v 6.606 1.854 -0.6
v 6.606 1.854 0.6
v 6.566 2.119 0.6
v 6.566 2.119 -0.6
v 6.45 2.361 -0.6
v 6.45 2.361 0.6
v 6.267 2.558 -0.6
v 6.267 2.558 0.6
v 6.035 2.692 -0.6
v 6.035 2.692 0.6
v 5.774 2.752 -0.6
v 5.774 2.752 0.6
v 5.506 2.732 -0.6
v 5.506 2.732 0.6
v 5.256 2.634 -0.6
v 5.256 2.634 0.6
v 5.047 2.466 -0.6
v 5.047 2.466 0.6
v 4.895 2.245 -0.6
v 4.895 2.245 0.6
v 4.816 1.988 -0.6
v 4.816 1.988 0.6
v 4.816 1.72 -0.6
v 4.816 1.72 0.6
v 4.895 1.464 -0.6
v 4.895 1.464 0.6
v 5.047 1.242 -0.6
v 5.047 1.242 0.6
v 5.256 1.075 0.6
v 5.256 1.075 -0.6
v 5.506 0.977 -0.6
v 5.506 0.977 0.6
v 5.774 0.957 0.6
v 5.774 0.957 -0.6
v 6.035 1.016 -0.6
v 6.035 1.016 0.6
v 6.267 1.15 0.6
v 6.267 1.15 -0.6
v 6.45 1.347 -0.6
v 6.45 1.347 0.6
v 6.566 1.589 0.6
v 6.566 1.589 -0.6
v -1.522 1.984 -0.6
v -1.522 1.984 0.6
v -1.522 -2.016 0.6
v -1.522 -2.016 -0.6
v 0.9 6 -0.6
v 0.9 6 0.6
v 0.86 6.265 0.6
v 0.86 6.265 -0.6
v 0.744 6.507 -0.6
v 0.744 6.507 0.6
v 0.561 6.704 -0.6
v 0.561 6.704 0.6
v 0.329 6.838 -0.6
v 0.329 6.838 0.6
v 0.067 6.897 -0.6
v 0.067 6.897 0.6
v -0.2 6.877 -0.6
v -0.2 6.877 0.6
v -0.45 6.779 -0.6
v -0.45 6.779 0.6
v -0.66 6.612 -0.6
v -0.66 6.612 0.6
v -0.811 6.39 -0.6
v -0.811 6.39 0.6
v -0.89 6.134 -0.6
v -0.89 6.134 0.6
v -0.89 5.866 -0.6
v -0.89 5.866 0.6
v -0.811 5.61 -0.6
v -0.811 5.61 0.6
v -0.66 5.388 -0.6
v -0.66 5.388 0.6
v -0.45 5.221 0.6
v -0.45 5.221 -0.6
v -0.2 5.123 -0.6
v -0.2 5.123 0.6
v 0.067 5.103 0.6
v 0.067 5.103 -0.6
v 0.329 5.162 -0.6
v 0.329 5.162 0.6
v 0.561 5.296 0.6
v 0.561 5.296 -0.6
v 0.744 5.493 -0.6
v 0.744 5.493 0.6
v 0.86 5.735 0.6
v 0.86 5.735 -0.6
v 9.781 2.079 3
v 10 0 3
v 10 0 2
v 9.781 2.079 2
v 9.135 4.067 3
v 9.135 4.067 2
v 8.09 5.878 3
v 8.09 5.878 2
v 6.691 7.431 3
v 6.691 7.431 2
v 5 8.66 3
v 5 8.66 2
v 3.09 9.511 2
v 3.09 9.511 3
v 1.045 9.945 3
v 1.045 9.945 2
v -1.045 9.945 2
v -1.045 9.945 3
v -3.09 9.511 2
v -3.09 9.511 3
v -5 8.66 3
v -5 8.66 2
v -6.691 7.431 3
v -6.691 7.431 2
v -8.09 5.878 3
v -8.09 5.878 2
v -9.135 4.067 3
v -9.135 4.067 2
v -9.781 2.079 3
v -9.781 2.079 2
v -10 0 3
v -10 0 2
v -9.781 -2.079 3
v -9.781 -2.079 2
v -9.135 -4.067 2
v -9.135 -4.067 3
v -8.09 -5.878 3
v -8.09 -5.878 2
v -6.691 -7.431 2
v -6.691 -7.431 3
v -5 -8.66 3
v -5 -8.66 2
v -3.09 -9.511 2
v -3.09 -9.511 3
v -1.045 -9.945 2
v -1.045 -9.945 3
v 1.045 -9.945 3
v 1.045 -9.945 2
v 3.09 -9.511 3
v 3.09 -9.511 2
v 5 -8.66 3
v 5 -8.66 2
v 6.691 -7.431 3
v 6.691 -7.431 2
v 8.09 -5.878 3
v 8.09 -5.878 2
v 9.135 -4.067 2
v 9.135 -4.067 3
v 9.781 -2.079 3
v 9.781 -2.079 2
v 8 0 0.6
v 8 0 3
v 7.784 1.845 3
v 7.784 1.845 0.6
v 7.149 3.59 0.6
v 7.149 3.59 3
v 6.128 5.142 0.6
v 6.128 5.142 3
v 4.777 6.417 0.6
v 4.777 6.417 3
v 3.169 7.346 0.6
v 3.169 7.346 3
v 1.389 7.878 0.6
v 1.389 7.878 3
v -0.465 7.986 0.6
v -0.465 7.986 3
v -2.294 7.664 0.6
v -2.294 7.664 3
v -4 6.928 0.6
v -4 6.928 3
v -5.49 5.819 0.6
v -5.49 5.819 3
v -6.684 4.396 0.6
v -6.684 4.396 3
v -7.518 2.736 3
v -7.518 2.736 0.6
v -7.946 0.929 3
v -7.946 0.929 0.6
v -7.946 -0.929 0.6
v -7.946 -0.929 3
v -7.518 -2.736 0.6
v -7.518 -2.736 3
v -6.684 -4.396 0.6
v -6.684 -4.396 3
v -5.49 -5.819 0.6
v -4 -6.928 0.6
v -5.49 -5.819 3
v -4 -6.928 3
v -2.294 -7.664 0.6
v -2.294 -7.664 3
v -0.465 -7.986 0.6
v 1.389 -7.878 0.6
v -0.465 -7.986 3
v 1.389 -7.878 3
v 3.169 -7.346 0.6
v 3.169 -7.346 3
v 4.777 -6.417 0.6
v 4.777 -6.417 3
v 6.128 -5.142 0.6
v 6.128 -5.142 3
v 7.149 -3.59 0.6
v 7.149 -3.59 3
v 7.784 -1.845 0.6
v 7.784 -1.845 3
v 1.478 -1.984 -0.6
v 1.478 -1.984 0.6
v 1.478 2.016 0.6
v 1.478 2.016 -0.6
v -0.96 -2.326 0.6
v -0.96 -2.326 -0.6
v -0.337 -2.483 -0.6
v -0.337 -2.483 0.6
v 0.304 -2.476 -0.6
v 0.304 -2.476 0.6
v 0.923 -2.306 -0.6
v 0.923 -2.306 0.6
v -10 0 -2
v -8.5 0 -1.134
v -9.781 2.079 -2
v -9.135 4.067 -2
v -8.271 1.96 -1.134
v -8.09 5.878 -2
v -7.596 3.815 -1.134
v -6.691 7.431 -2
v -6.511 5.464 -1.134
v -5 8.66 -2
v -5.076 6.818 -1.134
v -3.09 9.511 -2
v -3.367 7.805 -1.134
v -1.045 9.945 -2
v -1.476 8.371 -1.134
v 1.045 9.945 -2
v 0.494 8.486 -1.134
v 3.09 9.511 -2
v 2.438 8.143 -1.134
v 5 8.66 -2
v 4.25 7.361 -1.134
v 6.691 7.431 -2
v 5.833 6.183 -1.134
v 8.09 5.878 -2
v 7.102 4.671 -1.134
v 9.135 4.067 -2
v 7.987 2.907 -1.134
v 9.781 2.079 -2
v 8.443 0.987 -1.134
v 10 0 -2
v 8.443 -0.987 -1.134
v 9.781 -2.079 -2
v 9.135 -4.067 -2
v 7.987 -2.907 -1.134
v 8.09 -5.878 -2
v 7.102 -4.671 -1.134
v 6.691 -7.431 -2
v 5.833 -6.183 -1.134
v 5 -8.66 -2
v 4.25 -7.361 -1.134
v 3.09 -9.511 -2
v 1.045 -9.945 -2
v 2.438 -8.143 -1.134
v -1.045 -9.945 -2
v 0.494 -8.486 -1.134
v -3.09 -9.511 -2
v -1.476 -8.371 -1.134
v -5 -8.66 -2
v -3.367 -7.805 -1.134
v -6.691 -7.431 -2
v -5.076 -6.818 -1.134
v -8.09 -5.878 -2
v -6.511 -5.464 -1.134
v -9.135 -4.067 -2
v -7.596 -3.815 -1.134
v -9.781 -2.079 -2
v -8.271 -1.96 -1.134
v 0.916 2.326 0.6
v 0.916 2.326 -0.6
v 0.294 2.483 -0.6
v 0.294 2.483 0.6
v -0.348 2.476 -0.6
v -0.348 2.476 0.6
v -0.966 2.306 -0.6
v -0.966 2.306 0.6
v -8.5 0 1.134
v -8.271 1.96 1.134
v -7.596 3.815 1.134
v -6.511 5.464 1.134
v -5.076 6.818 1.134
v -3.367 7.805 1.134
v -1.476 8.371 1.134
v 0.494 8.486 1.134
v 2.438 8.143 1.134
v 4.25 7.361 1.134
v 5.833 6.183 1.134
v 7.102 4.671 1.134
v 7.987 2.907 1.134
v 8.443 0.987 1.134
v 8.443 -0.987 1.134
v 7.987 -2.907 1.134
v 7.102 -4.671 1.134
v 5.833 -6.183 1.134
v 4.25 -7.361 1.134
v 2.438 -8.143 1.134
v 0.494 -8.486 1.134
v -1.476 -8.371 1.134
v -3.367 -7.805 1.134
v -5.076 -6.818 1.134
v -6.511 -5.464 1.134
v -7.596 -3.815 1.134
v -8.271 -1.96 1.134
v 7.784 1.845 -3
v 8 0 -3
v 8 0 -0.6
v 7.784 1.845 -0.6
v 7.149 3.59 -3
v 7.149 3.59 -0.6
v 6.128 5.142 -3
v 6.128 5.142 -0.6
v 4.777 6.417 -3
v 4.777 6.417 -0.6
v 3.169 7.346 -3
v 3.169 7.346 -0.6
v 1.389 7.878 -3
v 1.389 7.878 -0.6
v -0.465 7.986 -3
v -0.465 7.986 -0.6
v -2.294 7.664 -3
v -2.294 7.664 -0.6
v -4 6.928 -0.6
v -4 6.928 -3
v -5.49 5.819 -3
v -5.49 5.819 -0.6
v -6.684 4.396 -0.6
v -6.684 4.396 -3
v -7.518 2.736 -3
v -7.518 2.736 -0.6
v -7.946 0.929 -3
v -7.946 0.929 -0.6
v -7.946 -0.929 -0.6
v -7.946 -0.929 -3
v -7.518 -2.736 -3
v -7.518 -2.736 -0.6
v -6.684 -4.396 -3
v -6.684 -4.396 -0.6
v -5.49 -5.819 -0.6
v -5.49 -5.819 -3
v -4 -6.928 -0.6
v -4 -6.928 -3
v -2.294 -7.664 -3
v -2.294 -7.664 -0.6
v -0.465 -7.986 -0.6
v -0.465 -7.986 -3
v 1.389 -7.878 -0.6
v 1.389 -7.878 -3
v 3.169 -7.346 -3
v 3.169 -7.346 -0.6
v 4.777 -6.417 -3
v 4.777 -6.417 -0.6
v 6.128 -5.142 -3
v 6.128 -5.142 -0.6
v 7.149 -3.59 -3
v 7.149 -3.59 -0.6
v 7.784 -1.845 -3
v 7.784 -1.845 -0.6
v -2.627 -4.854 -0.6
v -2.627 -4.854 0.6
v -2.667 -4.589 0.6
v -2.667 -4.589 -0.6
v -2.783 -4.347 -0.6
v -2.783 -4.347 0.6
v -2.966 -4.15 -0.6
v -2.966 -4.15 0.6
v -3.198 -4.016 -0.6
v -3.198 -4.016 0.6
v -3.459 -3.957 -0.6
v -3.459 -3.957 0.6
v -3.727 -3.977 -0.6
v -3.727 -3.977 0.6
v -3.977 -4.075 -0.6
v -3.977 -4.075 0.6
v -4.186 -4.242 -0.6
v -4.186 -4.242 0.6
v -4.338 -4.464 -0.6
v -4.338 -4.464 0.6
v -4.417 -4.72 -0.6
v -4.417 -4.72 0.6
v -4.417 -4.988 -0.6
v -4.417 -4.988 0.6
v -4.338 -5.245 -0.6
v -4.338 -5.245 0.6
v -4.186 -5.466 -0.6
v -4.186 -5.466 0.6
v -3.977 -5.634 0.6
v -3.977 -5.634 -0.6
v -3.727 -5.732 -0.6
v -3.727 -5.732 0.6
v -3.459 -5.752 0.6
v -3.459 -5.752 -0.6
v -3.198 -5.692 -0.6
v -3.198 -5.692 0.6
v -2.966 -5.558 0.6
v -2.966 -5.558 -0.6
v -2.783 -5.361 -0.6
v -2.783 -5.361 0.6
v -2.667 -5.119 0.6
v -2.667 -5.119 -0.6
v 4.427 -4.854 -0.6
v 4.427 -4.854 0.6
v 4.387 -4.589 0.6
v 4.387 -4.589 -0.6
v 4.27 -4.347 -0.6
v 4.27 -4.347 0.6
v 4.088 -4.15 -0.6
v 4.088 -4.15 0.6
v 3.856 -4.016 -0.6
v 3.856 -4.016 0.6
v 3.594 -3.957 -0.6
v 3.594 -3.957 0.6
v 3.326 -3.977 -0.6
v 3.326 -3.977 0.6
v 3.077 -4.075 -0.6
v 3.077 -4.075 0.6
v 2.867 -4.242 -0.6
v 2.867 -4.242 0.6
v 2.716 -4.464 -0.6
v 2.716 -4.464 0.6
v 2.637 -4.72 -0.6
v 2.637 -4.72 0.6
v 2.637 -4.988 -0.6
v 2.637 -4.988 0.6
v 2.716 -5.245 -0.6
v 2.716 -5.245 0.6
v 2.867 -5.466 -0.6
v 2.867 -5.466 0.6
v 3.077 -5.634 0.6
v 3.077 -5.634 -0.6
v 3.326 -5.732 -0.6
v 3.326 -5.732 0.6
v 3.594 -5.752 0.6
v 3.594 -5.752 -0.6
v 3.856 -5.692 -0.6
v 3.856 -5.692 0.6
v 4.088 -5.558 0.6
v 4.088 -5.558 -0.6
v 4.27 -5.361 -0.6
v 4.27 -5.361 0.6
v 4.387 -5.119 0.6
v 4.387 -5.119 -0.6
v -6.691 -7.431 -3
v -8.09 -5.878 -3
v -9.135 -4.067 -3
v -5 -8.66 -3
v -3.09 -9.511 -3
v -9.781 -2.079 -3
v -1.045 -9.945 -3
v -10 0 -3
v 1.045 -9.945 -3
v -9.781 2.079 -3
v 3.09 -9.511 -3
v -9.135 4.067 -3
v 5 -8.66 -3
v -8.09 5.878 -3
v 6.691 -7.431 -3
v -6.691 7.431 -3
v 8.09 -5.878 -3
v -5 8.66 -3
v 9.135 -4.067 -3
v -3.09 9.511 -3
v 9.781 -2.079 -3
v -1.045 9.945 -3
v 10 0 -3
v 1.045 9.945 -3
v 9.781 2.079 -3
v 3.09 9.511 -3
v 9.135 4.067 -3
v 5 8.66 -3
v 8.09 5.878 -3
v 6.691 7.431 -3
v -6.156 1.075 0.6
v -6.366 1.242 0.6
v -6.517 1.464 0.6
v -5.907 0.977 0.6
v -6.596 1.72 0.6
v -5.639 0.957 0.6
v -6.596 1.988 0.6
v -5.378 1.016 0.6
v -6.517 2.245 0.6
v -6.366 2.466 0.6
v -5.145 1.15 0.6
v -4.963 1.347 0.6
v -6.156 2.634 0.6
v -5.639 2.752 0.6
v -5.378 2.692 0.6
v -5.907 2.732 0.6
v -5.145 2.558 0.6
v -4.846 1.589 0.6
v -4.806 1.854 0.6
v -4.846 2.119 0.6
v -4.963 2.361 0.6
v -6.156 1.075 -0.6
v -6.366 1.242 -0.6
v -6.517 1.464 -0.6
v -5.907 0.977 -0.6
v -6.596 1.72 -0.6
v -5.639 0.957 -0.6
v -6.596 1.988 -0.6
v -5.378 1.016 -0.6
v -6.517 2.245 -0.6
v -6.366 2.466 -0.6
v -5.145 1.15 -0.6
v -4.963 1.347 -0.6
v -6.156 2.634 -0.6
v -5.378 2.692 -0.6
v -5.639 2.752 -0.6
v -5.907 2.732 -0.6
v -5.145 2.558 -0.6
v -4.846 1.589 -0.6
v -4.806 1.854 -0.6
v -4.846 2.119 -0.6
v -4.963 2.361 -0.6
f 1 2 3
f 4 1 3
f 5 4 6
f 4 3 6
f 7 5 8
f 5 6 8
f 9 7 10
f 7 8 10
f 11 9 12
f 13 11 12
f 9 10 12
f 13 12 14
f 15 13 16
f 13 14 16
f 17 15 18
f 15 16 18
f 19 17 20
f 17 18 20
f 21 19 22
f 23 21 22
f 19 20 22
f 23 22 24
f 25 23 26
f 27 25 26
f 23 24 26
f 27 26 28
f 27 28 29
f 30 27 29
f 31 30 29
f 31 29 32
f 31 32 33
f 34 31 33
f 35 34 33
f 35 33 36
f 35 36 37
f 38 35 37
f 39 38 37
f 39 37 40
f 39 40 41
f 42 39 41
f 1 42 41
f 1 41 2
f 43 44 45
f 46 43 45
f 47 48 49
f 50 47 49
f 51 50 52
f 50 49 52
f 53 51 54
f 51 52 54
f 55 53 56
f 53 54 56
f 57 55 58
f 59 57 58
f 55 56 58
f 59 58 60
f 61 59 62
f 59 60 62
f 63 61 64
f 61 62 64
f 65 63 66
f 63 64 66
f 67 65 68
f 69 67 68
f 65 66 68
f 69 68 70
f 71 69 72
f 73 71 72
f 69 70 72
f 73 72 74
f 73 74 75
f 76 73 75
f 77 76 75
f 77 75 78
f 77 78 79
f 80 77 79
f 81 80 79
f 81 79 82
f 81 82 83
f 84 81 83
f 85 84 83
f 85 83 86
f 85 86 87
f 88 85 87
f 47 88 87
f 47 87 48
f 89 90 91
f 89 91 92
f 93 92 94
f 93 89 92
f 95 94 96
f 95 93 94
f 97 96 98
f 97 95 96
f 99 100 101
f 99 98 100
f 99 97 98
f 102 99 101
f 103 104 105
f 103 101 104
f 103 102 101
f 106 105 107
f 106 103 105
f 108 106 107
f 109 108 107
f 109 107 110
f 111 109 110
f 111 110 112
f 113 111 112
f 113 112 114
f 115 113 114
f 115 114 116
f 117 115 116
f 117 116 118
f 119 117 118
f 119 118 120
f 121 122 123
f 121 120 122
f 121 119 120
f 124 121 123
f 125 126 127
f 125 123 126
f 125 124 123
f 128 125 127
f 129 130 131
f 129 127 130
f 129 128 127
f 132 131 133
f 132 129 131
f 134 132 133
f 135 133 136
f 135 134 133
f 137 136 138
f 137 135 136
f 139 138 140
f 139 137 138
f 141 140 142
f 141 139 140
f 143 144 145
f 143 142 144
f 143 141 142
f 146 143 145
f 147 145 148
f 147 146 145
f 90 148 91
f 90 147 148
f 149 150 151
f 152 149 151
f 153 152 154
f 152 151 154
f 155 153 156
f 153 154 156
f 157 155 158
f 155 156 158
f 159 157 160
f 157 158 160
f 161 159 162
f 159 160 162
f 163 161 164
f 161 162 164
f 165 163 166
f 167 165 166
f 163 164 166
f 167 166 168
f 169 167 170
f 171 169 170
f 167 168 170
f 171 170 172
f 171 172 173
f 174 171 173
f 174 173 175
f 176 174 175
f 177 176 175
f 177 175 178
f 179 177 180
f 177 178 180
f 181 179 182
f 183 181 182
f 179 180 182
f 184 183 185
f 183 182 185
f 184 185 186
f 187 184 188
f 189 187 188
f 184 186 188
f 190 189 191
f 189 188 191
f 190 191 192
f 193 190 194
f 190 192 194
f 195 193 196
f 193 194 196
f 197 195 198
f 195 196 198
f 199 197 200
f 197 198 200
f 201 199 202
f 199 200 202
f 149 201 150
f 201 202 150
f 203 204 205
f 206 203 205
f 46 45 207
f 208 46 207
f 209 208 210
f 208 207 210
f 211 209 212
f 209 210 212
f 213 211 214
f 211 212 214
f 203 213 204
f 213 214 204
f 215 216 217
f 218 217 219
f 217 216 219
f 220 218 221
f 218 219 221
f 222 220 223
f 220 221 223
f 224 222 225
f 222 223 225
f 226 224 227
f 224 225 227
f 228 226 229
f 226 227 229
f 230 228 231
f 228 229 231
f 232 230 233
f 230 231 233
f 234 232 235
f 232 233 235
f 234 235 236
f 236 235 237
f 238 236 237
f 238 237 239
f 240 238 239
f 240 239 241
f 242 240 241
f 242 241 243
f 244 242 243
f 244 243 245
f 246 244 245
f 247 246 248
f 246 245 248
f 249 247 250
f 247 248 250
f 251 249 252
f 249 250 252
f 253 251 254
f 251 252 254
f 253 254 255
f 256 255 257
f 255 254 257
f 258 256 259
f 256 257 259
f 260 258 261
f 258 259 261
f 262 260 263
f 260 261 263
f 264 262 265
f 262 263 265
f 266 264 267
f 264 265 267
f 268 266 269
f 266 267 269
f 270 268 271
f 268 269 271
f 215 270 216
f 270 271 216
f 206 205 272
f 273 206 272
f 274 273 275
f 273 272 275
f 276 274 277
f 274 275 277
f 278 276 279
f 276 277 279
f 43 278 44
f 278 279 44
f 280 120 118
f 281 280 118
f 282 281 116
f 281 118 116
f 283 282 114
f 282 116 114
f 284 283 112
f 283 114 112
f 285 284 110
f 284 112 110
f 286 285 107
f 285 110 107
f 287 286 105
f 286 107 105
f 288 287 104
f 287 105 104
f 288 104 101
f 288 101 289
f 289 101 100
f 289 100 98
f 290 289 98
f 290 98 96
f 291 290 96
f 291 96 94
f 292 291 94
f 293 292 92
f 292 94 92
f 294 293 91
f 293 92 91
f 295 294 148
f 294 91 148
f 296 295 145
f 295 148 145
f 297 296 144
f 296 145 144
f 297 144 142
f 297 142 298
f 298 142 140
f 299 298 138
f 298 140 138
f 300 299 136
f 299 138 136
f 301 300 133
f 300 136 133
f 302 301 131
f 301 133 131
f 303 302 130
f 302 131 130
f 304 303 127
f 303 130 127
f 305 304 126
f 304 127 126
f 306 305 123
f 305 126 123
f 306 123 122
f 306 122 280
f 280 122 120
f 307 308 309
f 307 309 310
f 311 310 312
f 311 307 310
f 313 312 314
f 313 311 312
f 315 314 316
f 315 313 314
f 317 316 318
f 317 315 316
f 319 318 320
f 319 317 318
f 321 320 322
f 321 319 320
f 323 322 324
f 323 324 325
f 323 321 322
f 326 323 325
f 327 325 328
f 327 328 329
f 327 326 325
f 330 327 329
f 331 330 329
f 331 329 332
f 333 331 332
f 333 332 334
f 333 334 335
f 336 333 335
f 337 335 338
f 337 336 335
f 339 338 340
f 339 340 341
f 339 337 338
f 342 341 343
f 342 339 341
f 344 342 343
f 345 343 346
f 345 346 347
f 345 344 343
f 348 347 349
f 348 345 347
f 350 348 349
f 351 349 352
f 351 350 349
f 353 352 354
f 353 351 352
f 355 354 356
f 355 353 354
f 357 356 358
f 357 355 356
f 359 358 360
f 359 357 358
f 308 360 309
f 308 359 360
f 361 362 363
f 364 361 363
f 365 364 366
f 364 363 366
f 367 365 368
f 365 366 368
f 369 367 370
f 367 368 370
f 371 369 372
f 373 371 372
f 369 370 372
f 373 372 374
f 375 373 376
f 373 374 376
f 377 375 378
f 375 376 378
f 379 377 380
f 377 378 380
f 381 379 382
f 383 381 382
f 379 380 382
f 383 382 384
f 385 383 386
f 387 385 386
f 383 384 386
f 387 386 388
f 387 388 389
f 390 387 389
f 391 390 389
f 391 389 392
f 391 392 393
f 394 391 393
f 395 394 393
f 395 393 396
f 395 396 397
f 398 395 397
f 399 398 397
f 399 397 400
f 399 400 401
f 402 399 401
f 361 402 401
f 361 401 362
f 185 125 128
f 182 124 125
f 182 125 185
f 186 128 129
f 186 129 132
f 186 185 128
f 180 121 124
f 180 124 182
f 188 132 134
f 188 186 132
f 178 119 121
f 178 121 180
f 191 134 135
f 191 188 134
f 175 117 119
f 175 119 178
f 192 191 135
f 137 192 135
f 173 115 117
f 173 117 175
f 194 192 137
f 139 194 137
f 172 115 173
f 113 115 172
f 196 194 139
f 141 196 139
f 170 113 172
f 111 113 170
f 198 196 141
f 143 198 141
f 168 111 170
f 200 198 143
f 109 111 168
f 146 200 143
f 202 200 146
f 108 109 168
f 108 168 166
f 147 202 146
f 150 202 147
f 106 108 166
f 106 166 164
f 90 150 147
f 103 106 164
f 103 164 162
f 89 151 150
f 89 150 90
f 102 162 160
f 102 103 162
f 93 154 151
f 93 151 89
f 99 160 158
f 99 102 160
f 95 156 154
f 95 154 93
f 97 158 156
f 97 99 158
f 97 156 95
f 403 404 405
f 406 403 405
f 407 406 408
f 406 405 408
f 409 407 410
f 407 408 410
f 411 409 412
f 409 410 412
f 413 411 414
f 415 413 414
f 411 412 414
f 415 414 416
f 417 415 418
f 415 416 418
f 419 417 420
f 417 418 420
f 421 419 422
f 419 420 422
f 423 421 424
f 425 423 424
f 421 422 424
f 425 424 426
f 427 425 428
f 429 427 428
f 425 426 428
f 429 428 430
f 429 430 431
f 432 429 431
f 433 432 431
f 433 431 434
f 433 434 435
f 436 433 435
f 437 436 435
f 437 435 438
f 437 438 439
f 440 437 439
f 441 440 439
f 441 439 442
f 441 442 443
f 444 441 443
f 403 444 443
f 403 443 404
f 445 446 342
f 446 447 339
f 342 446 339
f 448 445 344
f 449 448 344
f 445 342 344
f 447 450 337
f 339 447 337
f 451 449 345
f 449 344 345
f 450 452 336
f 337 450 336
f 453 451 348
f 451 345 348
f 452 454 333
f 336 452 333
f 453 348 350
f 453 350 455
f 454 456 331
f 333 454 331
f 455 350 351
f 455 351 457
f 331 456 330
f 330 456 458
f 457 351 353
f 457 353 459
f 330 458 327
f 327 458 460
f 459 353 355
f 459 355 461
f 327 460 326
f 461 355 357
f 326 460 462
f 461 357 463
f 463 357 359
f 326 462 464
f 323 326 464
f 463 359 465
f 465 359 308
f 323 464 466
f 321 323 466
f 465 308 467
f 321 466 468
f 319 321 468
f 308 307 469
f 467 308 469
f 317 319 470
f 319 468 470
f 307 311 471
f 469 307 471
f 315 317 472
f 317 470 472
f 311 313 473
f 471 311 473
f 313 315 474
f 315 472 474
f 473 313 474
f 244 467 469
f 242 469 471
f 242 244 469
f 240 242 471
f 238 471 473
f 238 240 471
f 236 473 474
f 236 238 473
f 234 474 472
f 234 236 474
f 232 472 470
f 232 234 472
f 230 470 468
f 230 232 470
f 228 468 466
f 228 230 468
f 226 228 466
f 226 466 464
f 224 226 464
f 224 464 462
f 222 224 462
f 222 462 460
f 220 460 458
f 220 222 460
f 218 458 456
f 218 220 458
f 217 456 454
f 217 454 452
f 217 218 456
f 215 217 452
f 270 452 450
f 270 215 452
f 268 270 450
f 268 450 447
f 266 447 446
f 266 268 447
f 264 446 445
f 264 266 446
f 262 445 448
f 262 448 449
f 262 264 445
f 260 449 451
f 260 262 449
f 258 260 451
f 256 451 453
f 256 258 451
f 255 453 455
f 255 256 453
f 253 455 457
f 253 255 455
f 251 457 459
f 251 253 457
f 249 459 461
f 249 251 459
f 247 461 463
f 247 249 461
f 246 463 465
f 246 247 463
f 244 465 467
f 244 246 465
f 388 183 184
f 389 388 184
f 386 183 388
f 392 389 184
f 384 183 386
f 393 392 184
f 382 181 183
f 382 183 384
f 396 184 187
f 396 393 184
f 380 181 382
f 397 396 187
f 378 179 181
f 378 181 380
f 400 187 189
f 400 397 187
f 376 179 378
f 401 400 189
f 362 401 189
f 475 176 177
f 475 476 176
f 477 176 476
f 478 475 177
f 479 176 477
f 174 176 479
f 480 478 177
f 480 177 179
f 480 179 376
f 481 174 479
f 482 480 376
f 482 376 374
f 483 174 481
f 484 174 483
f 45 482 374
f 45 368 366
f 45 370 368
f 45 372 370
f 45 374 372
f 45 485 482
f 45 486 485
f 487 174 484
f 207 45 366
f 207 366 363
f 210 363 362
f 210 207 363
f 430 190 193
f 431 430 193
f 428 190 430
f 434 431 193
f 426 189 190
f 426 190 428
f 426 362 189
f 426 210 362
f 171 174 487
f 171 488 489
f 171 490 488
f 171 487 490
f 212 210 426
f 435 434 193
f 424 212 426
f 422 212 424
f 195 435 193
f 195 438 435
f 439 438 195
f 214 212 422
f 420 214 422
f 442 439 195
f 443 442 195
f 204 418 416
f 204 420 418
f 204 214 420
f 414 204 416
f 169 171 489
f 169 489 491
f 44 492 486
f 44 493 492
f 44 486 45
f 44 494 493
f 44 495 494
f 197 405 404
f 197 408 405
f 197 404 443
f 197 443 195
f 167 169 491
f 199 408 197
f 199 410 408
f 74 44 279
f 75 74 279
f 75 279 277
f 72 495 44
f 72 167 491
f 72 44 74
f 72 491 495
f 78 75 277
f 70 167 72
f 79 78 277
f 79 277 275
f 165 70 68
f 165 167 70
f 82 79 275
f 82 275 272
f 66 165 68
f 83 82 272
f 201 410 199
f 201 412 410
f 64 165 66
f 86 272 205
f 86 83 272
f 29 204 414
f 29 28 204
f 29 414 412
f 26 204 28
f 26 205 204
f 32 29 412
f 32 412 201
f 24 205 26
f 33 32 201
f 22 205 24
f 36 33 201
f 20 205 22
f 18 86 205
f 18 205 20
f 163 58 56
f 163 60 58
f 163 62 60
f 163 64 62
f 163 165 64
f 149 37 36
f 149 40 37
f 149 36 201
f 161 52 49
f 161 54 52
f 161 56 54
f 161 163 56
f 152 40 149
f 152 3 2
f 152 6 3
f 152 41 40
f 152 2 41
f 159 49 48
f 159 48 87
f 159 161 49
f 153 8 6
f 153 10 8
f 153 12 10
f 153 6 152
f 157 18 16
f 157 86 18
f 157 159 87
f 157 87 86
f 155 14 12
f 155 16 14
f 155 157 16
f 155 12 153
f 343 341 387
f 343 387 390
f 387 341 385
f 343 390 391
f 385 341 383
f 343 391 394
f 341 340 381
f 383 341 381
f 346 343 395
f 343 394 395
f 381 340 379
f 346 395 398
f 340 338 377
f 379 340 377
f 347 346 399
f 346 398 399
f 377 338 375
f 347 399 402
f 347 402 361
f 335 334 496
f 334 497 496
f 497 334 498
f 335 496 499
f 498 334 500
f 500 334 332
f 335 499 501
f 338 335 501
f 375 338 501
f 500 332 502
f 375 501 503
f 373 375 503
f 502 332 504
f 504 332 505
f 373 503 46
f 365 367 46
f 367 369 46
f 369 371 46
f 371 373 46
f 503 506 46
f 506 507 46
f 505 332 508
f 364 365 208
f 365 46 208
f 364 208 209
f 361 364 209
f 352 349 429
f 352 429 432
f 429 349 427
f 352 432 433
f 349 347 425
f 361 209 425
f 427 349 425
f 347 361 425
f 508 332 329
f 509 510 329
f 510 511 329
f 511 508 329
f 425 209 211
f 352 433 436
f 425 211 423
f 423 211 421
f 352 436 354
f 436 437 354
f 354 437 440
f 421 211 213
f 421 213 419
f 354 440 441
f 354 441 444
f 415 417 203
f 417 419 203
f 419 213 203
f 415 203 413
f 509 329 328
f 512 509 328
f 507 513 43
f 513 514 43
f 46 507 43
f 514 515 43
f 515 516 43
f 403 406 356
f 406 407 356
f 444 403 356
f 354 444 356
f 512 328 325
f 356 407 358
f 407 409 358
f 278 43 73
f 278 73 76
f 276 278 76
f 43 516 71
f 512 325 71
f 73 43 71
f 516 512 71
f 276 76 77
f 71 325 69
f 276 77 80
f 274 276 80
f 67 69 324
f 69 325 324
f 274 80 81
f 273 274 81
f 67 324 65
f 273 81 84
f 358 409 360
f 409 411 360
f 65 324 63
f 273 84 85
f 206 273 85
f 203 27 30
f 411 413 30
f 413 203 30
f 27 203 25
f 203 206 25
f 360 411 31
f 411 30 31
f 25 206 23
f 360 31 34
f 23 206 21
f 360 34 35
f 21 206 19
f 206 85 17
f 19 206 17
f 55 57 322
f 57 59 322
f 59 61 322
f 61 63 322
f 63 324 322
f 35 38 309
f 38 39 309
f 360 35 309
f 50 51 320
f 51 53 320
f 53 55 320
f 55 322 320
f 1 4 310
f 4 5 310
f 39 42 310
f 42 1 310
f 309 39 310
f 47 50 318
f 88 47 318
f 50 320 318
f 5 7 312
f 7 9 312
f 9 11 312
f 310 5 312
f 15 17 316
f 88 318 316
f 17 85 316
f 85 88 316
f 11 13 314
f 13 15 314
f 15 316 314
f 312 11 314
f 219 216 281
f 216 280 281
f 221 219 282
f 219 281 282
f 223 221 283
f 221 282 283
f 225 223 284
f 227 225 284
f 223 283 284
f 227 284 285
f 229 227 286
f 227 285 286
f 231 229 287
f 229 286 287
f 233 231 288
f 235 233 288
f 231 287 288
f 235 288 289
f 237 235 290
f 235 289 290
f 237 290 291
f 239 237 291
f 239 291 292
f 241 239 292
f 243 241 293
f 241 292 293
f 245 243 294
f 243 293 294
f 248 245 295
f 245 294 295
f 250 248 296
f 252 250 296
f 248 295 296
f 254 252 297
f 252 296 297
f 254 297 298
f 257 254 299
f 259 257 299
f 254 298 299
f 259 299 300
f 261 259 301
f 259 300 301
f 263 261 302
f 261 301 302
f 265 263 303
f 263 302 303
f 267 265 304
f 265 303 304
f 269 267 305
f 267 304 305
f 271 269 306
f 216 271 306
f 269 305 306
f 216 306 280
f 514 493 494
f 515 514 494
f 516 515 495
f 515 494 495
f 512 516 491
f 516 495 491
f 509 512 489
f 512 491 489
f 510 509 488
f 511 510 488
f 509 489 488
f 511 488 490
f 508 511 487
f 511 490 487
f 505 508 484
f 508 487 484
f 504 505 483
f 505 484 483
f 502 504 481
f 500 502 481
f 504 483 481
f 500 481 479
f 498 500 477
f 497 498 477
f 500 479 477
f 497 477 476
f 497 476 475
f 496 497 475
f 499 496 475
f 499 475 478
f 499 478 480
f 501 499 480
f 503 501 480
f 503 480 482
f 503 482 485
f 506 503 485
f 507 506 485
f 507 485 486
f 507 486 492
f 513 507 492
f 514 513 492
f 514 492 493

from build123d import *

# Parameters (mm, degrees)
SKETCH1_R           = 10
BOSS_EXTRUDE1_DEPTH = 3
SKETCH2_R           = 8
CUT_EXTRUDE1_DEPTH  = 2.4
SKETCH3_R           = 0.9
CUT_EXTRUDE3_DEPTH  = 4.6


with BuildPart() as part:
    # Sketch1 → Boss-Extrude1 (new body, symmetric)
    with BuildSketch(Plane.XY):
        Circle(SKETCH1_R)
        with BuildLine():
            Line((-1.521572539, 1.983637318), (-1.521572539, -2.016362682))
            ThreePointArc((-1.521572539, -2.016362682), (-0.016245384, -2.500087973), (1.478251514, -1.983871914))
            Line((1.478251514, -1.983871914), (1.478251514, 2.016128086))
            ThreePointArc((1.478251514, 2.016128086), (-0.02707564, 2.499853378), (-1.521572539, 1.983637318))
        make_face(mode=Mode.SUBTRACT)
    extrude(amount=BOSS_EXTRUDE1_DEPTH, both=True)

    # Sketch2 → Cut-Extrude1 (cut)
    with BuildSketch(Plane.XY.offset(3)):
        Circle(SKETCH2_R)
    cut_extrude1 = extrude(amount=-CUT_EXTRUDE1_DEPTH, mode=Mode.SUBTRACT)

    # Mirror1: Cut-Extrude1 across plane
    add(cut_extrude1.mirror(Plane.XY), mode=Mode.SUBTRACT)

    # Sketch5 → Cut-Revolve1 (revolve, cut)
    with BuildSketch(Plane(origin=(0, 0, 0), x_dir=(1, 0, 0), z_dir=(0, 1, 0))):
        Polygon((-10, 2), (-8.5, 1.133974596), (-8.5, -1.133974596), (-10, -2), align=None)
    revolve(axis=Axis((0, 0, 0), (0, 0, -1)), mode=Mode.SUBTRACT)

    # Sketch3 → Cut-Extrude3 (cut, through all)
    with BuildSketch(Plane.XY.offset(0.6)):
        with Locations((-3.526711514, -4.854101966)):
            Circle(SKETCH3_R)
        with Locations((0, 6)):
            Circle(SKETCH3_R)
        with Locations((5.706339098, 1.854101966)):
            Circle(SKETCH3_R)
        with Locations((3.526711514, -4.854101966)):
            Circle(SKETCH3_R)
        with Locations((-5.706339098, 1.854101966)):
            Circle(SKETCH3_R)
    extrude(amount=-CUT_EXTRUDE3_DEPTH, mode=Mode.SUBTRACT)


solid = part.part
